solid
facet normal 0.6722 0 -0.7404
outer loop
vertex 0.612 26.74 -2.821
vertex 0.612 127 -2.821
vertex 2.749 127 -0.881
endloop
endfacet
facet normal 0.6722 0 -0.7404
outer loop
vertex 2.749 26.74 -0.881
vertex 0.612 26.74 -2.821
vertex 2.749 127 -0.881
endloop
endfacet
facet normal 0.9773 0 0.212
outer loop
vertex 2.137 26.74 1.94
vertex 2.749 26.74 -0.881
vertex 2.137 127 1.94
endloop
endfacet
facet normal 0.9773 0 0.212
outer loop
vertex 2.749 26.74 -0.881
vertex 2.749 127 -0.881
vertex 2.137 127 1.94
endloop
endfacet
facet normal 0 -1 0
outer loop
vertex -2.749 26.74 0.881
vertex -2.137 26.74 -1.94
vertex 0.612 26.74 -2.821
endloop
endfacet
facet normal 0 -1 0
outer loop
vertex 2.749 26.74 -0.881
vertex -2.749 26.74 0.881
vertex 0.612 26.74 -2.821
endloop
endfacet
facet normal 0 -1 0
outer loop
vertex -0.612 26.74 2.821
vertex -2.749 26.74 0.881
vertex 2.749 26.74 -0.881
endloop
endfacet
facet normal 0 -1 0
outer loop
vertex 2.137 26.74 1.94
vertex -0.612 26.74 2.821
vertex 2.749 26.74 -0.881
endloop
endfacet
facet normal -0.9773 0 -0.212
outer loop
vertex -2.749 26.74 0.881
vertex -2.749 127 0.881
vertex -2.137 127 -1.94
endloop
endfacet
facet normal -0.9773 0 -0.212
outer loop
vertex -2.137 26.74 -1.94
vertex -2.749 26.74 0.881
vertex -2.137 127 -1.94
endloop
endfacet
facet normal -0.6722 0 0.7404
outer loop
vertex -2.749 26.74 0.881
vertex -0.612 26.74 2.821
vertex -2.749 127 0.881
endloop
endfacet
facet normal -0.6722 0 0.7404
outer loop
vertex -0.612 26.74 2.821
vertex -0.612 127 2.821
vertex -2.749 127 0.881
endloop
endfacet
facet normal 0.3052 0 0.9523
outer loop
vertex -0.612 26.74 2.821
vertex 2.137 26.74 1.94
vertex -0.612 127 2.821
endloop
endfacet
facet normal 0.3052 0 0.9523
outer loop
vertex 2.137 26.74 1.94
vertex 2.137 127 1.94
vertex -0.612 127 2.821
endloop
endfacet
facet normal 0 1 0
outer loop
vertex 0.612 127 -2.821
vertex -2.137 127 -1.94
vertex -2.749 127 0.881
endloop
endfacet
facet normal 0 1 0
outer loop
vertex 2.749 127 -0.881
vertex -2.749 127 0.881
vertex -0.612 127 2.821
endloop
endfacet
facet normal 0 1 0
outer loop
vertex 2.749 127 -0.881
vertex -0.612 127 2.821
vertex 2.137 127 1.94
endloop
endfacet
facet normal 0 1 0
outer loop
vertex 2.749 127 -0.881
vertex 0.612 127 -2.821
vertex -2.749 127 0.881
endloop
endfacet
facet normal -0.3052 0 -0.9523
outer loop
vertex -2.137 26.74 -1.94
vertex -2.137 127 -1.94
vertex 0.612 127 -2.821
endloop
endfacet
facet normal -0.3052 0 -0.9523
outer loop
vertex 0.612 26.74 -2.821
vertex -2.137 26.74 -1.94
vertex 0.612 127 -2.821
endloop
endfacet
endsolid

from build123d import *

# Parameters (mm, degrees)
BOSS_EXTRUDE1_DEPTH = 127
SKETCH3_W           = 20.194547067
SKETCH3_H           = 18.170773651
CUT_EXTRUDE1_DEPTH  = 38.1
BOSS_EXTRUDE2_DEPTH = 2.54
SKETCH5_W           = 34.517572909
SKETCH5_H           = 22.340458643
CUT_EXTRUDE2_DEPTH  = 50
BOSS_EXTRUDE3_DEPTH = 25
BOSS_EXTRUDE4_DEPTH = 13.5
BOSS_EXTRUDE5_DEPTH = 20.32


with BuildPart() as part:
    # Sketch2 → Boss-Extrude1 (new body)
    with BuildSketch(Plane(origin=(0, 0, 0), x_dir=(1, 0, 0), z_dir=(0, 1, 0))):
        Polygon((2.137295047, -1.940438924), (2.749116926, 0.880732344), (0.611821879, 2.821171268), (-2.137295047, 1.940438924), (-2.749116926, -0.880732344), (-0.611821879, -2.821171268), align=None)
    extrude(amount=BOSS_EXTRUDE1_DEPTH)

    # Sketch3 → Cut-Extrude1 (cut)
    with BuildSketch(Plane.XZ):
        with Locations((-3.121926418, 0.771419978)):
            Rectangle(SKETCH3_W, SKETCH3_H)
    extrude(amount=-CUT_EXTRUDE1_DEPTH, mode=Mode.SUBTRACT)

    # Sketch4 → Boss-Extrude2 (add)
    with BuildSketch(Plane.XZ.offset(-38.1)):
        Polygon((0.611821879, -2.821171268), (2.749116926, -0.880732344), (2.137295047, 1.940438924), (-0.611821879, 2.821171268), (-2.749116926, 0.880732344), (-2.137295047, -1.940438924), align=None)
    extrude(amount=BOSS_EXTRUDE2_DEPTH)

    # Sketch5 → Cut-Extrude2 (cut)
    with BuildSketch(Plane.XZ.offset(-35.56)):
        with Locations((-1.3482575, -1.032578251)):
            Rectangle(SKETCH5_W, SKETCH5_H)
    extrude(amount=-CUT_EXTRUDE2_DEPTH, mode=Mode.SUBTRACT)

    # Sketch7 → Boss-Extrude3 (add)
    with BuildSketch(Plane.XZ.offset(-85.56)):
        Polygon((0.611821879, -2.821171268), (2.749116926, -0.880732344), (2.137295047, 1.940438924), (-0.611821879, 2.821171268), (-2.749116926, 0.880732344), (-2.137295047, -1.940438924), align=None)
    extrude(amount=BOSS_EXTRUDE3_DEPTH)

    # Sketch8 → Boss-Extrude4 (add)
    with BuildSketch(Plane.XZ.offset(-60.56)):
        Polygon((0.611821879, -2.821171268), (2.749116926, -0.880732344), (2.137295047, 1.940438924), (-0.611821879, 2.821171268), (-2.749116926, 0.880732344), (-2.137295047, -1.940438924), align=None)
    extrude(amount=BOSS_EXTRUDE4_DEPTH)

    # Sketch9 → Boss-Extrude5 (add)
    with BuildSketch(Plane.XZ.offset(-47.06)):
        Polygon((0.611821879, -2.821171268), (2.749116926, -0.880732344), (2.137295047, 1.940438924), (-0.611821879, 2.821171268), (-2.749116926, 0.880732344), (-2.137295047, -1.940438924), align=None)
    extrude(amount=BOSS_EXTRUDE5_DEPTH)


solid = part.part
